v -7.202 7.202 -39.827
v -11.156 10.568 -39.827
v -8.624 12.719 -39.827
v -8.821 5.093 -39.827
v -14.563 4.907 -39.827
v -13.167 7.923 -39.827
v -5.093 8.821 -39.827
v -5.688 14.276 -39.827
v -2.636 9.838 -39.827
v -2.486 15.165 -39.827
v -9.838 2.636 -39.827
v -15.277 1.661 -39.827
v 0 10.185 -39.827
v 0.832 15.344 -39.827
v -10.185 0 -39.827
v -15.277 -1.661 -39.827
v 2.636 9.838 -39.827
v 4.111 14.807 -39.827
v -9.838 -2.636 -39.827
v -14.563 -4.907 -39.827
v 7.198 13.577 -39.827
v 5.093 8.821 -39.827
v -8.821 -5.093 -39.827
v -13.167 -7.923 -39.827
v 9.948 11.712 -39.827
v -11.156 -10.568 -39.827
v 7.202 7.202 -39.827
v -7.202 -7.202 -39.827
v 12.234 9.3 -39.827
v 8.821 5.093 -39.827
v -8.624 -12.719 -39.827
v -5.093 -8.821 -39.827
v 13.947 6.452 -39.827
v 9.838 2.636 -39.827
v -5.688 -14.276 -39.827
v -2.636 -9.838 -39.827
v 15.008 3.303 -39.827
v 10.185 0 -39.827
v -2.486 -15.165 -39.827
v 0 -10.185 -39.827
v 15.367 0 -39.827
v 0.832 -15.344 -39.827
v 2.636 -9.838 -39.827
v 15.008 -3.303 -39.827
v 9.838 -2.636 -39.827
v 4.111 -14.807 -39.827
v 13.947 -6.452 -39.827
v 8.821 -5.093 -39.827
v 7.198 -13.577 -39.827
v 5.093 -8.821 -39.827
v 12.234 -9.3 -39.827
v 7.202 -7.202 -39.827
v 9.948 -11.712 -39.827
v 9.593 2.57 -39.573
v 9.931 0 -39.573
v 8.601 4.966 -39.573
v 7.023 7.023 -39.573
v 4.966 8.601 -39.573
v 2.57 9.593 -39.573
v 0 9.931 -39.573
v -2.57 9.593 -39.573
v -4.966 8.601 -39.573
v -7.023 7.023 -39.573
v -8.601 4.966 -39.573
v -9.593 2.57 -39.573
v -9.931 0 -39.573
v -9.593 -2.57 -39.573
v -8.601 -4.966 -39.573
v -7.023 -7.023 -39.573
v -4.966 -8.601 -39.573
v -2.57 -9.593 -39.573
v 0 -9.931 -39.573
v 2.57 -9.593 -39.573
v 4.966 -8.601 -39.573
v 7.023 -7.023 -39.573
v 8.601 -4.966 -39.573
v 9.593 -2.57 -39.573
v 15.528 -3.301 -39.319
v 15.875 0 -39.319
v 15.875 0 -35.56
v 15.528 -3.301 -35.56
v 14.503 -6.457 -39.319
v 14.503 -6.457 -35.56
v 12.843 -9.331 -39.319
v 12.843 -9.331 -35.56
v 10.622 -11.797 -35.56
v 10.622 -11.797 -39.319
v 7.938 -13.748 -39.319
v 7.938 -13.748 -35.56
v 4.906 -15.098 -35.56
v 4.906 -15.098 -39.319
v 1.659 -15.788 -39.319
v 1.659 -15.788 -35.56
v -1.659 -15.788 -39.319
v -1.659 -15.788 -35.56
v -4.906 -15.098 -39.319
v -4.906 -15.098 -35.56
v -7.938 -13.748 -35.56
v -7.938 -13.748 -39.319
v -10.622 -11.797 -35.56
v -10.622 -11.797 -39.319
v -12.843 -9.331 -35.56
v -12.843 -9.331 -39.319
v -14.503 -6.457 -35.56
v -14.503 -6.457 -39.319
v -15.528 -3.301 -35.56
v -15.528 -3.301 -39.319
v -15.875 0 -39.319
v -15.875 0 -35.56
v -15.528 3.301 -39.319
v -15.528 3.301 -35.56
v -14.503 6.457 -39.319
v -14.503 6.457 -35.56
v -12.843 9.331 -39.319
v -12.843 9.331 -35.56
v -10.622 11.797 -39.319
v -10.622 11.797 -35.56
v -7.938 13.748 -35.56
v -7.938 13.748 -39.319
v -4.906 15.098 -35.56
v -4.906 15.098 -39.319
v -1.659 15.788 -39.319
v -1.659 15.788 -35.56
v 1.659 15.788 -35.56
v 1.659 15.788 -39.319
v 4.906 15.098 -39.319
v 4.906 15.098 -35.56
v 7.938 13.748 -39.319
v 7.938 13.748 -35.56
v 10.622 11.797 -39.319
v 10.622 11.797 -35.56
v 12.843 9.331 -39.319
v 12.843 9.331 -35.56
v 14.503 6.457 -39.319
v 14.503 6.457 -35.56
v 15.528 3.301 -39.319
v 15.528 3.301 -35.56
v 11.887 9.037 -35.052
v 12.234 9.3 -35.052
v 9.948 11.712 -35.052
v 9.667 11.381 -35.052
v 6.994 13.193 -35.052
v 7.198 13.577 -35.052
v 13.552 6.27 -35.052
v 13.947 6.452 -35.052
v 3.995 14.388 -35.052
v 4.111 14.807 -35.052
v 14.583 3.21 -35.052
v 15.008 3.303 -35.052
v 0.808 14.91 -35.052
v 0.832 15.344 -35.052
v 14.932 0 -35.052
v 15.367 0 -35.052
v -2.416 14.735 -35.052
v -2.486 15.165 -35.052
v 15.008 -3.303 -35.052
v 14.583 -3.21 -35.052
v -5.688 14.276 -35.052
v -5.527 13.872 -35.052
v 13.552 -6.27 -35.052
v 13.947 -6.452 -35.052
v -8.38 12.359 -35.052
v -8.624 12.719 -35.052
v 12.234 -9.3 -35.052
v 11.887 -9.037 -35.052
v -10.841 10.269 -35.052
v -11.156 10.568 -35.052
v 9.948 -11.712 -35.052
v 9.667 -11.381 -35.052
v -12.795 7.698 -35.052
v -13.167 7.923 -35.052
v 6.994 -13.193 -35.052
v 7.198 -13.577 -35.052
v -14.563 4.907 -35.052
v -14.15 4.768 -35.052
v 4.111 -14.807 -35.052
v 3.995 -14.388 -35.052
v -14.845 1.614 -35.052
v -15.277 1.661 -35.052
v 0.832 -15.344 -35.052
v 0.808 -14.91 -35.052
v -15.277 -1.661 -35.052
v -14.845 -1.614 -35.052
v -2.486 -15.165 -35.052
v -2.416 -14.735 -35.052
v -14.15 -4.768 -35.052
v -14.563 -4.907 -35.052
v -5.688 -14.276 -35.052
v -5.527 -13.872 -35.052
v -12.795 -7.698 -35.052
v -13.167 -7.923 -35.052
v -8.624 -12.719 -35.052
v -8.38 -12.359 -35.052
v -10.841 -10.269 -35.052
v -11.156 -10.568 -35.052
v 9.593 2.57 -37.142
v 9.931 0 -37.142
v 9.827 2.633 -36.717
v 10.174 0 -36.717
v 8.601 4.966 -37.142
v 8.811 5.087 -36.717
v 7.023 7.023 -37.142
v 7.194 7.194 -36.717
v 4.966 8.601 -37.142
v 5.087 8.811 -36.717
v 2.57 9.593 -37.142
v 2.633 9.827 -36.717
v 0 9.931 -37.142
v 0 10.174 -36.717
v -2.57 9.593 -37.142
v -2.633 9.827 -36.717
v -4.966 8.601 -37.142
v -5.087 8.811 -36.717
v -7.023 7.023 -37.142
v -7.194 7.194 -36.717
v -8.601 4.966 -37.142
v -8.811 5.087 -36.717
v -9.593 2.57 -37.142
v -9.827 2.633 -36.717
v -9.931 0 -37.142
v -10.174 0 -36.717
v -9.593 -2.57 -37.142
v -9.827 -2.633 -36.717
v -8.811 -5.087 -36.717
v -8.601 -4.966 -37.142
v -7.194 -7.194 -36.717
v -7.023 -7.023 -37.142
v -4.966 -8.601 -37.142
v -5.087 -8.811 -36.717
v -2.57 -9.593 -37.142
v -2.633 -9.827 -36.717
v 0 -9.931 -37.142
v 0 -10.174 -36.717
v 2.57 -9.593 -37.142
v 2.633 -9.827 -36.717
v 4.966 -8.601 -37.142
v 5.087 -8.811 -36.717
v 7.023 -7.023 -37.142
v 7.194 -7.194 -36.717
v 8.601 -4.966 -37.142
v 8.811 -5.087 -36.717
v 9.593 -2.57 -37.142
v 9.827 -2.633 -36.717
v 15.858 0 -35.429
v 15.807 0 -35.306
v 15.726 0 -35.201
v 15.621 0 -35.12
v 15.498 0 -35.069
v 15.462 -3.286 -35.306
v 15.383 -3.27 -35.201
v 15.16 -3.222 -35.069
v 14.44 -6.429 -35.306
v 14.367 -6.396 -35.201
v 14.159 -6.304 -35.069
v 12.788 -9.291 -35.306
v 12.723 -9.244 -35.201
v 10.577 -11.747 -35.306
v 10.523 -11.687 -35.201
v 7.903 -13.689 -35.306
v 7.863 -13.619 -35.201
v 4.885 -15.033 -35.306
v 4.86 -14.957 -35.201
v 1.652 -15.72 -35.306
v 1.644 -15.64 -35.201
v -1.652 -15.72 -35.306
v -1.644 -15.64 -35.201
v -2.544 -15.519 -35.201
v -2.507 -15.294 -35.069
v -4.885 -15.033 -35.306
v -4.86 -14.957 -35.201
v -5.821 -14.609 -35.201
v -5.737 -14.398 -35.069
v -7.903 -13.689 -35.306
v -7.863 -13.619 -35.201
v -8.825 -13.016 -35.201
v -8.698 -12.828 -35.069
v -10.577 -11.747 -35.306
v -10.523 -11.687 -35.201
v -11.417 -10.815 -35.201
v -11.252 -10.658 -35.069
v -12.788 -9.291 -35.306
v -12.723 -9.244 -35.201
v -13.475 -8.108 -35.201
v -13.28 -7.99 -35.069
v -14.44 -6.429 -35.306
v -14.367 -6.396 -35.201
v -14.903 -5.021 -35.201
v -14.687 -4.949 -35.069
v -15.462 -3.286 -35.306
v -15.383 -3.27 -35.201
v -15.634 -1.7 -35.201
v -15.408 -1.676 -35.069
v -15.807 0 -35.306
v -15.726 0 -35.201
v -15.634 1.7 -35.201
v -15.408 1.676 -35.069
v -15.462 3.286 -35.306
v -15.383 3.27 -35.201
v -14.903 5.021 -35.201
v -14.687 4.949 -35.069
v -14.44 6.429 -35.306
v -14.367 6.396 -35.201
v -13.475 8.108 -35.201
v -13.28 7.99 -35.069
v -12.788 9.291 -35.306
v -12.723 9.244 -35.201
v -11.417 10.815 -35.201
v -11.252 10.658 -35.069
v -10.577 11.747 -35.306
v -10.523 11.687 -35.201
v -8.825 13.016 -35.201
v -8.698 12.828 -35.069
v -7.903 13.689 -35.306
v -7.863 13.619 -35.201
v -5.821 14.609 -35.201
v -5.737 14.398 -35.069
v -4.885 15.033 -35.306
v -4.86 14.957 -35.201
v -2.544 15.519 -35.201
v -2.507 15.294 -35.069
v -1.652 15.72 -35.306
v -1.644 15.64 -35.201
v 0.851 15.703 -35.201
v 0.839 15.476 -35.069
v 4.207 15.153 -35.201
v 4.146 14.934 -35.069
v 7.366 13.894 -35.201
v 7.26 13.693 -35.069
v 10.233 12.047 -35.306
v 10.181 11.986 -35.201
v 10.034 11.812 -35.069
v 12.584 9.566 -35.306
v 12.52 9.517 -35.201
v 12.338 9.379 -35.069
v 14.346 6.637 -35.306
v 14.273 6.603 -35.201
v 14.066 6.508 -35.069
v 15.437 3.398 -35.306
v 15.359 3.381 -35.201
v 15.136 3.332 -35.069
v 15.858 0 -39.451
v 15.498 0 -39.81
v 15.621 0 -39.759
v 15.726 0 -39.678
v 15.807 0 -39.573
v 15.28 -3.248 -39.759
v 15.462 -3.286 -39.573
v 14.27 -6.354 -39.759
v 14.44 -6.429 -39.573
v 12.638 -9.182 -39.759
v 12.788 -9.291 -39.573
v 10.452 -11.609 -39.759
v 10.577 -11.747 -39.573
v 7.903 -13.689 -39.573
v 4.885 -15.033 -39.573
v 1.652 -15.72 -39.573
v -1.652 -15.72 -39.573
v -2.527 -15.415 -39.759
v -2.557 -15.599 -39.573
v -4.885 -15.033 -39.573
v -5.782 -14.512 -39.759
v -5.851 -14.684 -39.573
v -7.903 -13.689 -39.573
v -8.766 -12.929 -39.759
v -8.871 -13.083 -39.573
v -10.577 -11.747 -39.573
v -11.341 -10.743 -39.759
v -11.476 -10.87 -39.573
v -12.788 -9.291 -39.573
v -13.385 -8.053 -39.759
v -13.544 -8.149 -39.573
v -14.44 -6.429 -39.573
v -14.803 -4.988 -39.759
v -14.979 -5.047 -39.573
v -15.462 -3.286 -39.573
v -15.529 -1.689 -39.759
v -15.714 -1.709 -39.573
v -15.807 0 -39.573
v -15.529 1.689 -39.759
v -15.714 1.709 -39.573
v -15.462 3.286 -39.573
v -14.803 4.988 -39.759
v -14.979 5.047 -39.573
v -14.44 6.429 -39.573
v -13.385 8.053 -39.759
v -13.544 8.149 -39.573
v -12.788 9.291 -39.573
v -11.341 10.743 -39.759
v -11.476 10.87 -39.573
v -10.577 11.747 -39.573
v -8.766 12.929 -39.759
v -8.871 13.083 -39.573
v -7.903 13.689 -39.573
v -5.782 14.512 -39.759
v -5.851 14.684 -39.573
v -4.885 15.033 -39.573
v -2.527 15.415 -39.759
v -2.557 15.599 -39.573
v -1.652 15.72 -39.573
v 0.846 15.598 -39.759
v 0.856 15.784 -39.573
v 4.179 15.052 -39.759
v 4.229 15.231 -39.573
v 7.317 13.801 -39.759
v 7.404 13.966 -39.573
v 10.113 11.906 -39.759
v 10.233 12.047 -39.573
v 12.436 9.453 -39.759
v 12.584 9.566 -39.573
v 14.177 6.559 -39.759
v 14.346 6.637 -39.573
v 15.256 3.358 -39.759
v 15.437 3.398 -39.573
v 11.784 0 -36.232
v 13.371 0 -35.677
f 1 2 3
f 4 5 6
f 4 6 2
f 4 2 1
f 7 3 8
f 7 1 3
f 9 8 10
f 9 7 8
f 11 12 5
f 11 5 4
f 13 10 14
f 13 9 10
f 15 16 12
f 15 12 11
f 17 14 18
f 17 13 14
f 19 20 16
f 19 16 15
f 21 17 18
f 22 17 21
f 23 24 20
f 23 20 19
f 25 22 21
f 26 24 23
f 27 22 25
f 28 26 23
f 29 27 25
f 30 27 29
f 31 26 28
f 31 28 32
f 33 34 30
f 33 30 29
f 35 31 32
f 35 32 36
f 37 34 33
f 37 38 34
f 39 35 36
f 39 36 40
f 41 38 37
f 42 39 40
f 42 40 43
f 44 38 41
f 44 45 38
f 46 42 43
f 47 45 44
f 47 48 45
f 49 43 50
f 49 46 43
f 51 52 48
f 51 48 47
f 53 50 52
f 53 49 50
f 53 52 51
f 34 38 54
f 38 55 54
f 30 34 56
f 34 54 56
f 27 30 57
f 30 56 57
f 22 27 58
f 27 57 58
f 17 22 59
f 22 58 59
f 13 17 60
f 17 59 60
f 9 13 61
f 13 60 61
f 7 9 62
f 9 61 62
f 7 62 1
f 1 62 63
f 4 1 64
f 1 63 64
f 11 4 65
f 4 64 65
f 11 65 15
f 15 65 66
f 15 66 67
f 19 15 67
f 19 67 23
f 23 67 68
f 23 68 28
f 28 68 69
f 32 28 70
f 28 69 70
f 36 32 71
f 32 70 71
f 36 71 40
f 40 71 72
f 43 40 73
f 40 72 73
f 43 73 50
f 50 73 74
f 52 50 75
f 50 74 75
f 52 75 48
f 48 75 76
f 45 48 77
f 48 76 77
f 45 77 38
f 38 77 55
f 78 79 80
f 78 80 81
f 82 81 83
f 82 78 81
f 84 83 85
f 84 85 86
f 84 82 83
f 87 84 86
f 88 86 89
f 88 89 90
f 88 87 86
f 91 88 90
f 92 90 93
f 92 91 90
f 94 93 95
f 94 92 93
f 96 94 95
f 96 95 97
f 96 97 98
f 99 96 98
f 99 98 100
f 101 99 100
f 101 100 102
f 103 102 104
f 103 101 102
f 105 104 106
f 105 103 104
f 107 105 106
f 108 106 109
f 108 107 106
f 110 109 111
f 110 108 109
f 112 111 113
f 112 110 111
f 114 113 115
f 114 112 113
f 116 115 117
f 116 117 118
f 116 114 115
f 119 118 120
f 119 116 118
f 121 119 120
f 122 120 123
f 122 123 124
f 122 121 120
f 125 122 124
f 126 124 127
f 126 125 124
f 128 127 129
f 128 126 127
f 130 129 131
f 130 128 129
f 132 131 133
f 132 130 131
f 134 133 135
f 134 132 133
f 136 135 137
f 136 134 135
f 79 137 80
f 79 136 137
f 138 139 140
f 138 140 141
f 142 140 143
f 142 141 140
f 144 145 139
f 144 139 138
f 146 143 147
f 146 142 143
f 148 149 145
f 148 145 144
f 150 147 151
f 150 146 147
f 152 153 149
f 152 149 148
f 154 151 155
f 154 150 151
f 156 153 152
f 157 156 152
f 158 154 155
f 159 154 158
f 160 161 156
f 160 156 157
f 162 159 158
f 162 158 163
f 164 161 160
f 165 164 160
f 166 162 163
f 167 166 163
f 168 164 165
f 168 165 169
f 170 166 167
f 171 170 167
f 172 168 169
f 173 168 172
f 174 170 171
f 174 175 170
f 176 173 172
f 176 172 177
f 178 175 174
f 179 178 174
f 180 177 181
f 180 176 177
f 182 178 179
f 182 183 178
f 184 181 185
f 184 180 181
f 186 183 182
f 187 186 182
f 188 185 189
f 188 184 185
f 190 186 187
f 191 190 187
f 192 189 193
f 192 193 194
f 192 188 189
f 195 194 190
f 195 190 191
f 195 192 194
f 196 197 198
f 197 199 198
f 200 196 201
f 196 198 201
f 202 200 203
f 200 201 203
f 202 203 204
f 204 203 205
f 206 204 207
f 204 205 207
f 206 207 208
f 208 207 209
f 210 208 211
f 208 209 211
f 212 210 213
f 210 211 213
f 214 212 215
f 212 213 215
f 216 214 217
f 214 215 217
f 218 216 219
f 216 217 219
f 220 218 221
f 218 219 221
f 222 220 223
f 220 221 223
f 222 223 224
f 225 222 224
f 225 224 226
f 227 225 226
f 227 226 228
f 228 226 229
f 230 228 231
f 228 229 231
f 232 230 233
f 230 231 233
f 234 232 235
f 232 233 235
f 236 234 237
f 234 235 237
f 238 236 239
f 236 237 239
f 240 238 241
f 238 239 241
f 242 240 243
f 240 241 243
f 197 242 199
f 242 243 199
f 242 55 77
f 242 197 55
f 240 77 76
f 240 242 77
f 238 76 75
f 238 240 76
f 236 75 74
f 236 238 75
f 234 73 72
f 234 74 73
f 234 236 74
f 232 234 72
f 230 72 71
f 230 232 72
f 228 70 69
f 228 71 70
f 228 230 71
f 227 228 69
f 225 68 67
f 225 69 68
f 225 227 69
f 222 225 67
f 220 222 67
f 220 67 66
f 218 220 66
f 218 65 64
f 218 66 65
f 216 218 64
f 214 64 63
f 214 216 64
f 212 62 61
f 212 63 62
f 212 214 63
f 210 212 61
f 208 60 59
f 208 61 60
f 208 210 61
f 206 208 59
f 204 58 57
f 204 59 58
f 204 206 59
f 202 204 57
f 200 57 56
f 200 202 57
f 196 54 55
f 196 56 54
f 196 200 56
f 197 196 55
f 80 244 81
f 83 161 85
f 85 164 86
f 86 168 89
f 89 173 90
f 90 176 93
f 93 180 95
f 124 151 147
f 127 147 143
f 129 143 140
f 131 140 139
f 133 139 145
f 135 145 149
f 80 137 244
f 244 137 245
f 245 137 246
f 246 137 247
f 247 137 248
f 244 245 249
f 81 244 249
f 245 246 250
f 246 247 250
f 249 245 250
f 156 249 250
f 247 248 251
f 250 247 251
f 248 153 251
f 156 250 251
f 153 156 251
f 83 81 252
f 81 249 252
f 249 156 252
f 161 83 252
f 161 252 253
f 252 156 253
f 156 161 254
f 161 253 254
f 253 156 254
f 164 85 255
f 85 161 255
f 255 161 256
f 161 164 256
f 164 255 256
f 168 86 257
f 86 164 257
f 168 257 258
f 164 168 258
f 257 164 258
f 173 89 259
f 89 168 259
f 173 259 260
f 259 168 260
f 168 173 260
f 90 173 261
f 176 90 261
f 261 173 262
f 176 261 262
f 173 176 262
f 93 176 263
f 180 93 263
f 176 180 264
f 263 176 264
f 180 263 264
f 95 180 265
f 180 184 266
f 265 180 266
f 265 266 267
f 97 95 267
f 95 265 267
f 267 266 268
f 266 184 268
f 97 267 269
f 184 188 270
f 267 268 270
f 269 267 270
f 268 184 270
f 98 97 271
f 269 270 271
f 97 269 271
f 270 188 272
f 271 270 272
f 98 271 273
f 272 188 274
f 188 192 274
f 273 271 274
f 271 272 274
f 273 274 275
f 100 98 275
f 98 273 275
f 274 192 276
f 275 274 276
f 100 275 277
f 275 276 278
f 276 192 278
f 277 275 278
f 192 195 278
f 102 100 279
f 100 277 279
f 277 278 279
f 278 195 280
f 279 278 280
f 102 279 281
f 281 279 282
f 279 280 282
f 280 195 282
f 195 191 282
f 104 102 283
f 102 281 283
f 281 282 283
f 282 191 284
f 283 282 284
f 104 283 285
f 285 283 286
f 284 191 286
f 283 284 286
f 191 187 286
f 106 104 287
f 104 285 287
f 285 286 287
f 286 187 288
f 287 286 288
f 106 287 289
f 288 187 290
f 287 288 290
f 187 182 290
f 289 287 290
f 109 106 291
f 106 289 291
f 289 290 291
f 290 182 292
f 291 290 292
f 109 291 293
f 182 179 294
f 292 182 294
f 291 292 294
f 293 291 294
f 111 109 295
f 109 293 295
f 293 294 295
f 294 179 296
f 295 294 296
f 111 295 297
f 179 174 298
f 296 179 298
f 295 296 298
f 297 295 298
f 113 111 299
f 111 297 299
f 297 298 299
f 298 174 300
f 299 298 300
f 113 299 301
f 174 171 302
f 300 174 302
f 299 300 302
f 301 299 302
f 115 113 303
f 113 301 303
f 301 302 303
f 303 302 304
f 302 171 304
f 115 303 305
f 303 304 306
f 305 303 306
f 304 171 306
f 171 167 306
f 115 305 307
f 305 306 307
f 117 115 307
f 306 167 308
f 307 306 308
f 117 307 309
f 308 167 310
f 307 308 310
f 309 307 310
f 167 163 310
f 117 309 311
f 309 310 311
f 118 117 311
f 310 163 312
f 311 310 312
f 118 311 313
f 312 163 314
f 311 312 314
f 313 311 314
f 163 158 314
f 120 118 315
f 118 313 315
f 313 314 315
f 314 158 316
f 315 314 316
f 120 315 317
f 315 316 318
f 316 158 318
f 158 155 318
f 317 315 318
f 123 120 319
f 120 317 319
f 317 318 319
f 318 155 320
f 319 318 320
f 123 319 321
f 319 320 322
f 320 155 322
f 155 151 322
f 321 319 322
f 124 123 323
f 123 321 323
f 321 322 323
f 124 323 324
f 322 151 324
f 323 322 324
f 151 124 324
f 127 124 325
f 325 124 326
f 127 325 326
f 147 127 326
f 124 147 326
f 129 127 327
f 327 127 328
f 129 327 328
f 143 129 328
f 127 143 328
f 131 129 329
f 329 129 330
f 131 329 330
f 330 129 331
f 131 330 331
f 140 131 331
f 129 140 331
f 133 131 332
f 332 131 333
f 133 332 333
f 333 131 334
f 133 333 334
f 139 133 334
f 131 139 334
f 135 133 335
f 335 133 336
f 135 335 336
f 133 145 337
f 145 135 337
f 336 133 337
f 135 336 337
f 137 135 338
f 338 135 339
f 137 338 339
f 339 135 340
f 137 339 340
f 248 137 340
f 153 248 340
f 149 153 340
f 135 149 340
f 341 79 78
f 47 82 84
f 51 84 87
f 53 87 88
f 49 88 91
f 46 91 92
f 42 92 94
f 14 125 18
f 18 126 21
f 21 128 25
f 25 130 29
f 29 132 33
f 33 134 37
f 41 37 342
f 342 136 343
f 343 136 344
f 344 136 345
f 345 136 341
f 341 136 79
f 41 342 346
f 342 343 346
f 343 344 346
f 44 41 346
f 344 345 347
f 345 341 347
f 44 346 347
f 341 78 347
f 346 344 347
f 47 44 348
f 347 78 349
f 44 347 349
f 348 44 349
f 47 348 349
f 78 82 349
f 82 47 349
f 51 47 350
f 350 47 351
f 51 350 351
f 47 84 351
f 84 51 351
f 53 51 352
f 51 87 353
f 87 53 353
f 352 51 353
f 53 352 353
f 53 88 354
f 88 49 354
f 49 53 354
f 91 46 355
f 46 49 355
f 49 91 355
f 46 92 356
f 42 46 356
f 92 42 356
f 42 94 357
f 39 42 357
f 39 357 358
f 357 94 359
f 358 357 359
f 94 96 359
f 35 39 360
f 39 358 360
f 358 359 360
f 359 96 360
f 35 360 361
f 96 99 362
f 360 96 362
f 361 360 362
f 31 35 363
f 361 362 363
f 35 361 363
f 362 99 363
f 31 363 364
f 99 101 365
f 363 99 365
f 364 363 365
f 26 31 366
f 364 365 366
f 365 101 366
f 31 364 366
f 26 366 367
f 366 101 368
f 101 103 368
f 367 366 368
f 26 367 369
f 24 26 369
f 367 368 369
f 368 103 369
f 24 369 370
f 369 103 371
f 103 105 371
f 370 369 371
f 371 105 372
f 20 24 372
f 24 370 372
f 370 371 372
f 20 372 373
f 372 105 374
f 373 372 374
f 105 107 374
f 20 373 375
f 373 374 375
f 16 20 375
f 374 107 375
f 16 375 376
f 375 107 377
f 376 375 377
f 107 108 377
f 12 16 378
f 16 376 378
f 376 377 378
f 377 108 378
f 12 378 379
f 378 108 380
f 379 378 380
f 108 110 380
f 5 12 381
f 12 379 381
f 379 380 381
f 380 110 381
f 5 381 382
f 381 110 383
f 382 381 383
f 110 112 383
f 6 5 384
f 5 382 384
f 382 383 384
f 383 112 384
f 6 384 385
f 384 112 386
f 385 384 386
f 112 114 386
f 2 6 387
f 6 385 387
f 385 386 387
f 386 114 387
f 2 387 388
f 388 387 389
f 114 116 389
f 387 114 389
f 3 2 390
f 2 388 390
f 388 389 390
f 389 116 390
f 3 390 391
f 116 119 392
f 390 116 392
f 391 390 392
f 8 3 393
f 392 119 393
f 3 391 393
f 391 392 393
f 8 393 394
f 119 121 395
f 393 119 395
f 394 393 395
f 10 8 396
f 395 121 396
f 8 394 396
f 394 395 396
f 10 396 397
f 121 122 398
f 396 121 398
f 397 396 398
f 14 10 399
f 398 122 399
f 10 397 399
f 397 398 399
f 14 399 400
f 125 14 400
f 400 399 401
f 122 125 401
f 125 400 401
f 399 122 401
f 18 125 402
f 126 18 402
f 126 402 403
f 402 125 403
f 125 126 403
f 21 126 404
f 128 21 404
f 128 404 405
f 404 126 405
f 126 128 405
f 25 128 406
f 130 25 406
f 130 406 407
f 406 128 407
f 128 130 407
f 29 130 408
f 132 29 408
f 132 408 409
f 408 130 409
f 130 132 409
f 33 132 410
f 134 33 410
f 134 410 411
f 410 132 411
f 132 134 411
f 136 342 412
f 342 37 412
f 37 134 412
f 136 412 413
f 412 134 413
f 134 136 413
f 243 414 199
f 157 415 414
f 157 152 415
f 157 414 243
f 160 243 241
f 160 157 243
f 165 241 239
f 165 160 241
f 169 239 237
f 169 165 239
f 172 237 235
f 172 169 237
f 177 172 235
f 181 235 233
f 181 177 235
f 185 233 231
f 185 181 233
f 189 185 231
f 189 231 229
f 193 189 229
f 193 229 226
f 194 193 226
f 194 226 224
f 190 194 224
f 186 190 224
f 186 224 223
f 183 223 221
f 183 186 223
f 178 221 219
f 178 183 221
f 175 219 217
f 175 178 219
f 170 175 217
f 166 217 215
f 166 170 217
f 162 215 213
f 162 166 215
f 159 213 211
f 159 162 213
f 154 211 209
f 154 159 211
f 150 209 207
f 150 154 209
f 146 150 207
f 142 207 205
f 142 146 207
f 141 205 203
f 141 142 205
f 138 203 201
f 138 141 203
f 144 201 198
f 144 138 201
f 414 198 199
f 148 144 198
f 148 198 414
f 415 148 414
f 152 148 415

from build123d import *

# Parameters (mm, degrees)
FILLET2_R = 0.508


with BuildPart() as part:
    # Sketch1 → Revolve1 (revolve)
    with BuildSketch(Plane(origin=(0, 0, 0), x_dir=(0, 0, -1), z_dir=(1, 0, 0)), mode=Mode.PRIVATE) as revolve1_sk:
        with BuildLine():
            Line((39.8272, 15.875), (39.8272, 9.9314))
            Line((39.8272, 9.9314), (36.782839668, 9.9314))
            ThreePointArc((36.782839668, 9.9314), (36.004343784, 12.461830872), (35.052, 14.932089472))
            Line((35.052, 14.932089472), (35.052, 15.875))
            Line((35.052, 15.875), (39.8272, 15.875))
        make_face()
    revolve(revolve1_sk.sketch.rotate(Axis((0, 0, 0), (0, 0, -1)), 90), axis=Axis((0, 0, 0), (0, 0, -1)))

    # Chamfer1: read off the stored shape, not the designer's step
    # Chamfer1 outline → Chamfer1 (revolve, cut)
    with BuildSketch(Plane.XZ):
        Polygon((9.9314, -36.716530911), (9.9314, -37.142376439), (10.173807442, -36.716530911), align=None)
        Polygon((9.9314, -39.5732), (9.9314, -39.8272), (10.1854, -39.8272), align=None)
    revolve(axis=Axis((0, 0, 0), (0, 0, 1)), mode=Mode.SUBTRACT)

    # Fillet2
    fillet2_edges = [part.edges().sort_by_distance(p)[0] for p in [
        (-15.875, 0, -39.8272),
        (-15.875, 0, -35.052),
    ]]
    fillet(fillet2_edges, radius=FILLET2_R)


solid = part.part
